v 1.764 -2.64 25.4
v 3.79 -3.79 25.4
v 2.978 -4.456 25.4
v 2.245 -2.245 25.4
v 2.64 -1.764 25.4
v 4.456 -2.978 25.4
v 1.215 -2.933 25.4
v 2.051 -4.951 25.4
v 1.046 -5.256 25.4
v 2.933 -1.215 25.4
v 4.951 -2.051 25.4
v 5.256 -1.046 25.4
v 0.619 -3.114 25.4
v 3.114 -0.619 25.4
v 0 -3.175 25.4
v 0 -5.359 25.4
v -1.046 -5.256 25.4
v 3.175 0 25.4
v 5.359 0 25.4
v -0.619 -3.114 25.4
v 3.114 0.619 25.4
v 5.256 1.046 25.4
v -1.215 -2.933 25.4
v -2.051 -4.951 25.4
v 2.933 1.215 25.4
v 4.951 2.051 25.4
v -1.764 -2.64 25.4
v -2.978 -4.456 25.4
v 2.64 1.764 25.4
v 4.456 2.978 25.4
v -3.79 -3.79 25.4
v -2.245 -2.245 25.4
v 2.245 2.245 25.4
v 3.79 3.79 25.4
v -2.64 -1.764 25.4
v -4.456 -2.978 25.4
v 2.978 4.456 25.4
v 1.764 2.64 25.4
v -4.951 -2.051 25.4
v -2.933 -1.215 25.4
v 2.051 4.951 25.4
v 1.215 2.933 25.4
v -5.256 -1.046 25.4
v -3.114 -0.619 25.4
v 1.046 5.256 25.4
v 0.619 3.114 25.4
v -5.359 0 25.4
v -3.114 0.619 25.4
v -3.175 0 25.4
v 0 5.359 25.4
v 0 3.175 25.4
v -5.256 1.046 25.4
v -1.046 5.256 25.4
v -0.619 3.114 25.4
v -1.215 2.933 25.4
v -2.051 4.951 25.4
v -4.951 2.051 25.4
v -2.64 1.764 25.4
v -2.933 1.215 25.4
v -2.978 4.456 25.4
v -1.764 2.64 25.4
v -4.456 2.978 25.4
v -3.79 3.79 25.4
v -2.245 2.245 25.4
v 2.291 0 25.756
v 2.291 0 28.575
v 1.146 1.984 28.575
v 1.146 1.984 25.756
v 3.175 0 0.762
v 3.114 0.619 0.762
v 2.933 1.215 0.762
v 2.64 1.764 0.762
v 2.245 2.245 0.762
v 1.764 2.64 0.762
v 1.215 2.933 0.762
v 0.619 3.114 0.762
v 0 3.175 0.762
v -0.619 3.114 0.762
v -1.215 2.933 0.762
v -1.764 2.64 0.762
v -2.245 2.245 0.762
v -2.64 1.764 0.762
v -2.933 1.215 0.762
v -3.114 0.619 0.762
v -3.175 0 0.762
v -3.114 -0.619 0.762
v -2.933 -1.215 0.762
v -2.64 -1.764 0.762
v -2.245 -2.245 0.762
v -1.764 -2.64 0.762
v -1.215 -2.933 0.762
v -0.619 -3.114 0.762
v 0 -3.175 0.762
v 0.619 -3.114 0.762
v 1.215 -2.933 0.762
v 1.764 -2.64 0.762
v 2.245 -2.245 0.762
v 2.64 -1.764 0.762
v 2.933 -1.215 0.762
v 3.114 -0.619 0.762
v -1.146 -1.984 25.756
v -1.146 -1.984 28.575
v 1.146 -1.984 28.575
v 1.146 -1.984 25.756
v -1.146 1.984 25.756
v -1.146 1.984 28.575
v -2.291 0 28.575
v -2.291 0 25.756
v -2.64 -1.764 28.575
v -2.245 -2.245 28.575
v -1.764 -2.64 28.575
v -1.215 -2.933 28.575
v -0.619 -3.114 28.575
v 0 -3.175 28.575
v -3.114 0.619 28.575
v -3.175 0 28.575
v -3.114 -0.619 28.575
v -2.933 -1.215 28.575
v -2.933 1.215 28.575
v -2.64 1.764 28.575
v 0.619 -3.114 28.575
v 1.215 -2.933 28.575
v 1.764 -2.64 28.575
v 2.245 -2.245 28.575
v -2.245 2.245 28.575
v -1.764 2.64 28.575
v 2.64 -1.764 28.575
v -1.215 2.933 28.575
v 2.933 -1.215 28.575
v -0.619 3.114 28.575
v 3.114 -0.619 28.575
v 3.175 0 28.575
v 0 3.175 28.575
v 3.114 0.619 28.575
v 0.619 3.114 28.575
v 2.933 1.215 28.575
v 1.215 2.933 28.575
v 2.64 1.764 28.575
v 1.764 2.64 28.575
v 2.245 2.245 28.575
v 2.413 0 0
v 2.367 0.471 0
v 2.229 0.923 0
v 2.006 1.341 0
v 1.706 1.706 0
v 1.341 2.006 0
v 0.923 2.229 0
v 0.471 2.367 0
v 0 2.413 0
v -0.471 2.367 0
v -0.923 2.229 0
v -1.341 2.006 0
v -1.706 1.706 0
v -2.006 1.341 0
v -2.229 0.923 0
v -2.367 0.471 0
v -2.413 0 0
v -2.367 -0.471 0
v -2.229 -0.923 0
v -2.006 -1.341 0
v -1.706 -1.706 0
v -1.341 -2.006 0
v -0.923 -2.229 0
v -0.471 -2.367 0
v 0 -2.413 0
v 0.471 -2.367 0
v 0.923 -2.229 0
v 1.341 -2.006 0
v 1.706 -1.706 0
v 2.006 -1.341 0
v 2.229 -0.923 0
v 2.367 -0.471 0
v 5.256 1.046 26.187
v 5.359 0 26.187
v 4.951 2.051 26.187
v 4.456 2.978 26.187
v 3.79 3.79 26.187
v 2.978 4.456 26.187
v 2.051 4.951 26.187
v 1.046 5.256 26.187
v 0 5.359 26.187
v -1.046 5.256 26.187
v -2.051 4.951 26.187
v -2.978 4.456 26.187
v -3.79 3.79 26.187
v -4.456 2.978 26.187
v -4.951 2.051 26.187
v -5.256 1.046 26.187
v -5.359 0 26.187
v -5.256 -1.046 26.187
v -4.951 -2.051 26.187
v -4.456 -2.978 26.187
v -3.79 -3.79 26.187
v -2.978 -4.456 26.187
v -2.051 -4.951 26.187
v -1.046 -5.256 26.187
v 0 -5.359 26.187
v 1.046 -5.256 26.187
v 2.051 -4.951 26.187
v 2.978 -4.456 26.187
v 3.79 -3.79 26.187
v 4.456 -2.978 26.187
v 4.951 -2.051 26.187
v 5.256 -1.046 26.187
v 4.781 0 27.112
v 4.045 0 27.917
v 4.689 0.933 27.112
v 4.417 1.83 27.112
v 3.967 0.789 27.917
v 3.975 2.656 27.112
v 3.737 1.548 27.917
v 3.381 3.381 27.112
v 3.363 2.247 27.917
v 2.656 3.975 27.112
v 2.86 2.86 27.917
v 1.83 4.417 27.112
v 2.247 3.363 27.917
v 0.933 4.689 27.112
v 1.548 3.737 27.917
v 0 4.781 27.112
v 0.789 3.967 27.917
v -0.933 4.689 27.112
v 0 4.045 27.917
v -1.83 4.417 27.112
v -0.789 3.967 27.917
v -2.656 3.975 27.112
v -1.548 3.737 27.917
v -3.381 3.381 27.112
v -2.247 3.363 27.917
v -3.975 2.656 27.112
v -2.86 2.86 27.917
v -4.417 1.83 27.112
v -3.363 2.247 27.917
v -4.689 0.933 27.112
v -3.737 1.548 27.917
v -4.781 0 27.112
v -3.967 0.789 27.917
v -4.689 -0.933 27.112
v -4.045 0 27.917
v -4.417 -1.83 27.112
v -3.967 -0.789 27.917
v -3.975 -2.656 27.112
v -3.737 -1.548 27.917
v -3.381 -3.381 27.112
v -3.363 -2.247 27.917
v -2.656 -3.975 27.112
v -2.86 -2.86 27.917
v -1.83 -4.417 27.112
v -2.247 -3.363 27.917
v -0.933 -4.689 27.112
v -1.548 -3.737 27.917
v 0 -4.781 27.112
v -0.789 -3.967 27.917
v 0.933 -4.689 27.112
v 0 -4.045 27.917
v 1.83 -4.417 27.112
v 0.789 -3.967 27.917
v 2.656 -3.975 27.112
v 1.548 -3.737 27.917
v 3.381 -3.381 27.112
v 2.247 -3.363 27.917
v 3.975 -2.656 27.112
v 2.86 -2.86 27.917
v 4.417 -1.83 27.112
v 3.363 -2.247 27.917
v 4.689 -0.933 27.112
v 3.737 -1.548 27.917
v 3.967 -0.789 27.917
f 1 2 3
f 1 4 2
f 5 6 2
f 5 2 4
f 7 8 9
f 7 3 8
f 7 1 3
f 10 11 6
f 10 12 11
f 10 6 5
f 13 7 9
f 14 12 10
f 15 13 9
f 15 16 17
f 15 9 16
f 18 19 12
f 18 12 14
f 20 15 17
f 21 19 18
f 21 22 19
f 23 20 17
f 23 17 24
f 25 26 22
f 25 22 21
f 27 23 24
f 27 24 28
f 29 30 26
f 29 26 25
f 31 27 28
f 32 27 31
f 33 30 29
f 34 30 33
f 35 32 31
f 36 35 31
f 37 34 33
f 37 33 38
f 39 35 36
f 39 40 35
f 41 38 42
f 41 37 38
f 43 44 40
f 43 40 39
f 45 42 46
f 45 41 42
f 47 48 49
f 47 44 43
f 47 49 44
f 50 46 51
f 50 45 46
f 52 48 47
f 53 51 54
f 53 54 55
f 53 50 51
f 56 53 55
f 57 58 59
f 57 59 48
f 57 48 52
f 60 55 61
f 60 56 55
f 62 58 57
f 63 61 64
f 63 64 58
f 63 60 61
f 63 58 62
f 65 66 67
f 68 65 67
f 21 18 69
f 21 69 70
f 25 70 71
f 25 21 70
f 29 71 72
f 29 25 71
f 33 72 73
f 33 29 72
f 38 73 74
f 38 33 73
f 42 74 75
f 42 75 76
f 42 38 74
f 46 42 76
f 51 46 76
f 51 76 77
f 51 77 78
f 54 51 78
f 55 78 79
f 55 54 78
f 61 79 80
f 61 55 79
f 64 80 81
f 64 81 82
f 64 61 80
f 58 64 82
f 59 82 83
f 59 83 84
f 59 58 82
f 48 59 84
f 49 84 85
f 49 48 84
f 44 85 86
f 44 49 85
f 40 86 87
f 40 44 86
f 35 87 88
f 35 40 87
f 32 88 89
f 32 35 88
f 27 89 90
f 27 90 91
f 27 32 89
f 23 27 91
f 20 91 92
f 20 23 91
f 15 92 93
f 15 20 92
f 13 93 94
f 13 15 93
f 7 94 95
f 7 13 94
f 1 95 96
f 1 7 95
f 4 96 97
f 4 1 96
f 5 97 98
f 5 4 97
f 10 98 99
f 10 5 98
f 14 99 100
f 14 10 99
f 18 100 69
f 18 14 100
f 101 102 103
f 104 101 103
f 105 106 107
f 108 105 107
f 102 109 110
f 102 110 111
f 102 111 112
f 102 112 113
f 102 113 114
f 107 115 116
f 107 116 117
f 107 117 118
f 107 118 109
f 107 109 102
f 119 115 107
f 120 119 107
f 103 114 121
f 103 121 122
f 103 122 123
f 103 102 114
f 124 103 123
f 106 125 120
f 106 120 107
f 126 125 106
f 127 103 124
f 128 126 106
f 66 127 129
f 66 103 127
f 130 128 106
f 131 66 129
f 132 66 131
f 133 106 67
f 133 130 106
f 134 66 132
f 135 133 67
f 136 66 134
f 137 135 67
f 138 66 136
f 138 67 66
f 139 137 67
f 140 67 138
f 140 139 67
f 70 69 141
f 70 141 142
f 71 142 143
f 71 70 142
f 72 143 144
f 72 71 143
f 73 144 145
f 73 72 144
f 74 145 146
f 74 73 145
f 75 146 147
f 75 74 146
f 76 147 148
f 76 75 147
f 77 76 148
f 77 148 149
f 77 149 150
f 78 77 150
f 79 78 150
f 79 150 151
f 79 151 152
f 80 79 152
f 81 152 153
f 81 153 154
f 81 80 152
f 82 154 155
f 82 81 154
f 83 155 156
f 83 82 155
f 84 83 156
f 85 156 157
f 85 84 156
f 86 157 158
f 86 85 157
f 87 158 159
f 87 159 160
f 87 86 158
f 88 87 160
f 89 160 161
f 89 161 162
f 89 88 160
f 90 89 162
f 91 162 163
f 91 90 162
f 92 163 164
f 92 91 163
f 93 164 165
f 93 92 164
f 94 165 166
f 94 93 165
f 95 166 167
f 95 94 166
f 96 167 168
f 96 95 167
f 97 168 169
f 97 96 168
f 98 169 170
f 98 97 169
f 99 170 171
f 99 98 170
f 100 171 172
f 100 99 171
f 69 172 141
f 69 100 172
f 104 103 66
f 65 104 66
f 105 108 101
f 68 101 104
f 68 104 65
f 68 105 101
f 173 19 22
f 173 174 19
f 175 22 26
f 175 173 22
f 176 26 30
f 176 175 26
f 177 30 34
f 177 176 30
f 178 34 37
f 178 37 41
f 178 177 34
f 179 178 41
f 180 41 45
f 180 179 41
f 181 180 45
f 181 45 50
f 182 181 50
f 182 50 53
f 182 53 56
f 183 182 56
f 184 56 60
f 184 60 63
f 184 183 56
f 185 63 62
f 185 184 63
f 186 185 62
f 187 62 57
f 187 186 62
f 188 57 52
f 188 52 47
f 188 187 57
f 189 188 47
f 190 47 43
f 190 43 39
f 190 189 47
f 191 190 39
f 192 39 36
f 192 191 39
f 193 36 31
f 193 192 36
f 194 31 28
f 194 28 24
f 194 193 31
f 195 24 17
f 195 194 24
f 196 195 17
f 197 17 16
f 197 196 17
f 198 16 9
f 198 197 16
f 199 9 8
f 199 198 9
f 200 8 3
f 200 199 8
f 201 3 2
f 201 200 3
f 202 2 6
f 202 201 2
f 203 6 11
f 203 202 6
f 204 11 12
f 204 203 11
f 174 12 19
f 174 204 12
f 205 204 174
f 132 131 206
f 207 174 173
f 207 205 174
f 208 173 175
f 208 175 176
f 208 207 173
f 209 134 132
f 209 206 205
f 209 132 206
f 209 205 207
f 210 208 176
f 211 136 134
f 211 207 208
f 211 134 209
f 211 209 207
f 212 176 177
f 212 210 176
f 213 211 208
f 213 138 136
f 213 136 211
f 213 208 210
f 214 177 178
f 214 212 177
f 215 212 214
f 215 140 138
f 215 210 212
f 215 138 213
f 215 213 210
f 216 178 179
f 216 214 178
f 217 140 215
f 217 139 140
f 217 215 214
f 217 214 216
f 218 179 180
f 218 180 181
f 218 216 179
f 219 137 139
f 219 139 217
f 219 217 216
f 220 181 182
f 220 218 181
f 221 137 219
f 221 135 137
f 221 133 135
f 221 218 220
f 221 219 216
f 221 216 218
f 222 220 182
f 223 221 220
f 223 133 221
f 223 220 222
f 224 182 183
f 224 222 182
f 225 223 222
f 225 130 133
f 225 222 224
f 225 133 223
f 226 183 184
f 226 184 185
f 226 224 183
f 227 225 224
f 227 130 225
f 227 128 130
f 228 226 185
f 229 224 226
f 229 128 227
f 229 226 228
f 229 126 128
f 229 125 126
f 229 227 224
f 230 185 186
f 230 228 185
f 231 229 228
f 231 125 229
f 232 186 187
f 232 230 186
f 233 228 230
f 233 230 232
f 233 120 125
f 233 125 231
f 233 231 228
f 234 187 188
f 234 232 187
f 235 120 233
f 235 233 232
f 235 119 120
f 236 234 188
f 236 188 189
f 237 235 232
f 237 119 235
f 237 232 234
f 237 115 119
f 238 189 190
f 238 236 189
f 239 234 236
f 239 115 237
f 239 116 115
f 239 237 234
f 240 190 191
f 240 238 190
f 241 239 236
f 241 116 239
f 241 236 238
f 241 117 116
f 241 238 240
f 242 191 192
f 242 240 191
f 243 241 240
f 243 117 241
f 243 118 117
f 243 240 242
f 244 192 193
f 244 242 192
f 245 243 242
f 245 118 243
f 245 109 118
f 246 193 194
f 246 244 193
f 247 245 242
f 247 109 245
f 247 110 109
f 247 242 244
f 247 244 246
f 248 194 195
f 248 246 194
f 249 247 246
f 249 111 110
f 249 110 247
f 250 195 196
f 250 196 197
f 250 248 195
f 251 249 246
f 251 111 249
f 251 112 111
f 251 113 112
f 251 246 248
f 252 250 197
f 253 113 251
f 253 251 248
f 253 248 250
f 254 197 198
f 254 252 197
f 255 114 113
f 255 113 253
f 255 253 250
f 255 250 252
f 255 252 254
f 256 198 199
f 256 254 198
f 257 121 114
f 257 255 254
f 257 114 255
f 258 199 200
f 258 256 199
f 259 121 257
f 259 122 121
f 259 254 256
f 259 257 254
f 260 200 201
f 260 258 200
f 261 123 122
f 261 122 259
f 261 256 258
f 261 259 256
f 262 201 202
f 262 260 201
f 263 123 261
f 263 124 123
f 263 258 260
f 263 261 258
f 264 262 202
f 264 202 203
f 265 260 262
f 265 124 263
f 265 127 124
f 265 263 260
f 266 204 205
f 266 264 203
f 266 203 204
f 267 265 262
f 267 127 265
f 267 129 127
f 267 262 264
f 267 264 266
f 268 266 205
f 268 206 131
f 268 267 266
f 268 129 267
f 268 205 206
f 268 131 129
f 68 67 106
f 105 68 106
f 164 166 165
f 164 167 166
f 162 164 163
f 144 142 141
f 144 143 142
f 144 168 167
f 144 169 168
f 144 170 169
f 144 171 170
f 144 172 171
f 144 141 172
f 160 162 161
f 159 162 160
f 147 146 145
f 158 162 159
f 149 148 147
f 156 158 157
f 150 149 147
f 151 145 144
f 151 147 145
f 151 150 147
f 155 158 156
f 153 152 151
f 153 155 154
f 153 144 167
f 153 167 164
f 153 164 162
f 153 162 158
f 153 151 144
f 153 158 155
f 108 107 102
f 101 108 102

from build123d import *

# Parameters (mm, degrees)
F0_W     = 3.175
F0_H     = 25.4
F2_SIZE2 = 0.762
F2_SIZE  = 0.762
F4_DEPTH = 2.8194


with BuildPart() as f1:
    # F0 (on Front) → F1 (revolve)
    with BuildSketch(Plane.XZ):
        with Locations((1.5875, 12.7)):
            Rectangle(F0_W, F0_H)
        with BuildLine():
            Line((0, 28.575), (0, 25.4))
            Line((0, 25.4), (3.175, 25.4))
            Line((3.175, 25.4), (5.3594, 25.4))
            Line((5.3594, 25.4), (5.3594, 26.1874))
            ThreePointArc((5.3594, 26.1874), (4.431365, 27.531394), (3.175, 28.575))
            Line((3.175, 28.575), (0, 28.575))
        make_face()
    revolve(axis=Axis((0, 0, 12.7), (0, 0, 1)))

    # F2
    f2_edges = [f1.edges().sort_by_distance(p)[0] for p in [
        (-3.175, 0, 0),
    ]]
    chamfer(f2_edges, length=F2_SIZE, length2=F2_SIZE2)

    # F3 (on face) → F4 (cut)
    with BuildSketch(Plane.XY.offset(28.575)):
        Polygon((1.145679, 1.984375), (-1.145679, 1.984375), (-2.291359, 0), (-1.145679, -1.984375), (1.145679, -1.984375), (2.291359, 0), align=None)
    extrude(amount=-F4_DEPTH, mode=Mode.SUBTRACT)


solid = f1.part
